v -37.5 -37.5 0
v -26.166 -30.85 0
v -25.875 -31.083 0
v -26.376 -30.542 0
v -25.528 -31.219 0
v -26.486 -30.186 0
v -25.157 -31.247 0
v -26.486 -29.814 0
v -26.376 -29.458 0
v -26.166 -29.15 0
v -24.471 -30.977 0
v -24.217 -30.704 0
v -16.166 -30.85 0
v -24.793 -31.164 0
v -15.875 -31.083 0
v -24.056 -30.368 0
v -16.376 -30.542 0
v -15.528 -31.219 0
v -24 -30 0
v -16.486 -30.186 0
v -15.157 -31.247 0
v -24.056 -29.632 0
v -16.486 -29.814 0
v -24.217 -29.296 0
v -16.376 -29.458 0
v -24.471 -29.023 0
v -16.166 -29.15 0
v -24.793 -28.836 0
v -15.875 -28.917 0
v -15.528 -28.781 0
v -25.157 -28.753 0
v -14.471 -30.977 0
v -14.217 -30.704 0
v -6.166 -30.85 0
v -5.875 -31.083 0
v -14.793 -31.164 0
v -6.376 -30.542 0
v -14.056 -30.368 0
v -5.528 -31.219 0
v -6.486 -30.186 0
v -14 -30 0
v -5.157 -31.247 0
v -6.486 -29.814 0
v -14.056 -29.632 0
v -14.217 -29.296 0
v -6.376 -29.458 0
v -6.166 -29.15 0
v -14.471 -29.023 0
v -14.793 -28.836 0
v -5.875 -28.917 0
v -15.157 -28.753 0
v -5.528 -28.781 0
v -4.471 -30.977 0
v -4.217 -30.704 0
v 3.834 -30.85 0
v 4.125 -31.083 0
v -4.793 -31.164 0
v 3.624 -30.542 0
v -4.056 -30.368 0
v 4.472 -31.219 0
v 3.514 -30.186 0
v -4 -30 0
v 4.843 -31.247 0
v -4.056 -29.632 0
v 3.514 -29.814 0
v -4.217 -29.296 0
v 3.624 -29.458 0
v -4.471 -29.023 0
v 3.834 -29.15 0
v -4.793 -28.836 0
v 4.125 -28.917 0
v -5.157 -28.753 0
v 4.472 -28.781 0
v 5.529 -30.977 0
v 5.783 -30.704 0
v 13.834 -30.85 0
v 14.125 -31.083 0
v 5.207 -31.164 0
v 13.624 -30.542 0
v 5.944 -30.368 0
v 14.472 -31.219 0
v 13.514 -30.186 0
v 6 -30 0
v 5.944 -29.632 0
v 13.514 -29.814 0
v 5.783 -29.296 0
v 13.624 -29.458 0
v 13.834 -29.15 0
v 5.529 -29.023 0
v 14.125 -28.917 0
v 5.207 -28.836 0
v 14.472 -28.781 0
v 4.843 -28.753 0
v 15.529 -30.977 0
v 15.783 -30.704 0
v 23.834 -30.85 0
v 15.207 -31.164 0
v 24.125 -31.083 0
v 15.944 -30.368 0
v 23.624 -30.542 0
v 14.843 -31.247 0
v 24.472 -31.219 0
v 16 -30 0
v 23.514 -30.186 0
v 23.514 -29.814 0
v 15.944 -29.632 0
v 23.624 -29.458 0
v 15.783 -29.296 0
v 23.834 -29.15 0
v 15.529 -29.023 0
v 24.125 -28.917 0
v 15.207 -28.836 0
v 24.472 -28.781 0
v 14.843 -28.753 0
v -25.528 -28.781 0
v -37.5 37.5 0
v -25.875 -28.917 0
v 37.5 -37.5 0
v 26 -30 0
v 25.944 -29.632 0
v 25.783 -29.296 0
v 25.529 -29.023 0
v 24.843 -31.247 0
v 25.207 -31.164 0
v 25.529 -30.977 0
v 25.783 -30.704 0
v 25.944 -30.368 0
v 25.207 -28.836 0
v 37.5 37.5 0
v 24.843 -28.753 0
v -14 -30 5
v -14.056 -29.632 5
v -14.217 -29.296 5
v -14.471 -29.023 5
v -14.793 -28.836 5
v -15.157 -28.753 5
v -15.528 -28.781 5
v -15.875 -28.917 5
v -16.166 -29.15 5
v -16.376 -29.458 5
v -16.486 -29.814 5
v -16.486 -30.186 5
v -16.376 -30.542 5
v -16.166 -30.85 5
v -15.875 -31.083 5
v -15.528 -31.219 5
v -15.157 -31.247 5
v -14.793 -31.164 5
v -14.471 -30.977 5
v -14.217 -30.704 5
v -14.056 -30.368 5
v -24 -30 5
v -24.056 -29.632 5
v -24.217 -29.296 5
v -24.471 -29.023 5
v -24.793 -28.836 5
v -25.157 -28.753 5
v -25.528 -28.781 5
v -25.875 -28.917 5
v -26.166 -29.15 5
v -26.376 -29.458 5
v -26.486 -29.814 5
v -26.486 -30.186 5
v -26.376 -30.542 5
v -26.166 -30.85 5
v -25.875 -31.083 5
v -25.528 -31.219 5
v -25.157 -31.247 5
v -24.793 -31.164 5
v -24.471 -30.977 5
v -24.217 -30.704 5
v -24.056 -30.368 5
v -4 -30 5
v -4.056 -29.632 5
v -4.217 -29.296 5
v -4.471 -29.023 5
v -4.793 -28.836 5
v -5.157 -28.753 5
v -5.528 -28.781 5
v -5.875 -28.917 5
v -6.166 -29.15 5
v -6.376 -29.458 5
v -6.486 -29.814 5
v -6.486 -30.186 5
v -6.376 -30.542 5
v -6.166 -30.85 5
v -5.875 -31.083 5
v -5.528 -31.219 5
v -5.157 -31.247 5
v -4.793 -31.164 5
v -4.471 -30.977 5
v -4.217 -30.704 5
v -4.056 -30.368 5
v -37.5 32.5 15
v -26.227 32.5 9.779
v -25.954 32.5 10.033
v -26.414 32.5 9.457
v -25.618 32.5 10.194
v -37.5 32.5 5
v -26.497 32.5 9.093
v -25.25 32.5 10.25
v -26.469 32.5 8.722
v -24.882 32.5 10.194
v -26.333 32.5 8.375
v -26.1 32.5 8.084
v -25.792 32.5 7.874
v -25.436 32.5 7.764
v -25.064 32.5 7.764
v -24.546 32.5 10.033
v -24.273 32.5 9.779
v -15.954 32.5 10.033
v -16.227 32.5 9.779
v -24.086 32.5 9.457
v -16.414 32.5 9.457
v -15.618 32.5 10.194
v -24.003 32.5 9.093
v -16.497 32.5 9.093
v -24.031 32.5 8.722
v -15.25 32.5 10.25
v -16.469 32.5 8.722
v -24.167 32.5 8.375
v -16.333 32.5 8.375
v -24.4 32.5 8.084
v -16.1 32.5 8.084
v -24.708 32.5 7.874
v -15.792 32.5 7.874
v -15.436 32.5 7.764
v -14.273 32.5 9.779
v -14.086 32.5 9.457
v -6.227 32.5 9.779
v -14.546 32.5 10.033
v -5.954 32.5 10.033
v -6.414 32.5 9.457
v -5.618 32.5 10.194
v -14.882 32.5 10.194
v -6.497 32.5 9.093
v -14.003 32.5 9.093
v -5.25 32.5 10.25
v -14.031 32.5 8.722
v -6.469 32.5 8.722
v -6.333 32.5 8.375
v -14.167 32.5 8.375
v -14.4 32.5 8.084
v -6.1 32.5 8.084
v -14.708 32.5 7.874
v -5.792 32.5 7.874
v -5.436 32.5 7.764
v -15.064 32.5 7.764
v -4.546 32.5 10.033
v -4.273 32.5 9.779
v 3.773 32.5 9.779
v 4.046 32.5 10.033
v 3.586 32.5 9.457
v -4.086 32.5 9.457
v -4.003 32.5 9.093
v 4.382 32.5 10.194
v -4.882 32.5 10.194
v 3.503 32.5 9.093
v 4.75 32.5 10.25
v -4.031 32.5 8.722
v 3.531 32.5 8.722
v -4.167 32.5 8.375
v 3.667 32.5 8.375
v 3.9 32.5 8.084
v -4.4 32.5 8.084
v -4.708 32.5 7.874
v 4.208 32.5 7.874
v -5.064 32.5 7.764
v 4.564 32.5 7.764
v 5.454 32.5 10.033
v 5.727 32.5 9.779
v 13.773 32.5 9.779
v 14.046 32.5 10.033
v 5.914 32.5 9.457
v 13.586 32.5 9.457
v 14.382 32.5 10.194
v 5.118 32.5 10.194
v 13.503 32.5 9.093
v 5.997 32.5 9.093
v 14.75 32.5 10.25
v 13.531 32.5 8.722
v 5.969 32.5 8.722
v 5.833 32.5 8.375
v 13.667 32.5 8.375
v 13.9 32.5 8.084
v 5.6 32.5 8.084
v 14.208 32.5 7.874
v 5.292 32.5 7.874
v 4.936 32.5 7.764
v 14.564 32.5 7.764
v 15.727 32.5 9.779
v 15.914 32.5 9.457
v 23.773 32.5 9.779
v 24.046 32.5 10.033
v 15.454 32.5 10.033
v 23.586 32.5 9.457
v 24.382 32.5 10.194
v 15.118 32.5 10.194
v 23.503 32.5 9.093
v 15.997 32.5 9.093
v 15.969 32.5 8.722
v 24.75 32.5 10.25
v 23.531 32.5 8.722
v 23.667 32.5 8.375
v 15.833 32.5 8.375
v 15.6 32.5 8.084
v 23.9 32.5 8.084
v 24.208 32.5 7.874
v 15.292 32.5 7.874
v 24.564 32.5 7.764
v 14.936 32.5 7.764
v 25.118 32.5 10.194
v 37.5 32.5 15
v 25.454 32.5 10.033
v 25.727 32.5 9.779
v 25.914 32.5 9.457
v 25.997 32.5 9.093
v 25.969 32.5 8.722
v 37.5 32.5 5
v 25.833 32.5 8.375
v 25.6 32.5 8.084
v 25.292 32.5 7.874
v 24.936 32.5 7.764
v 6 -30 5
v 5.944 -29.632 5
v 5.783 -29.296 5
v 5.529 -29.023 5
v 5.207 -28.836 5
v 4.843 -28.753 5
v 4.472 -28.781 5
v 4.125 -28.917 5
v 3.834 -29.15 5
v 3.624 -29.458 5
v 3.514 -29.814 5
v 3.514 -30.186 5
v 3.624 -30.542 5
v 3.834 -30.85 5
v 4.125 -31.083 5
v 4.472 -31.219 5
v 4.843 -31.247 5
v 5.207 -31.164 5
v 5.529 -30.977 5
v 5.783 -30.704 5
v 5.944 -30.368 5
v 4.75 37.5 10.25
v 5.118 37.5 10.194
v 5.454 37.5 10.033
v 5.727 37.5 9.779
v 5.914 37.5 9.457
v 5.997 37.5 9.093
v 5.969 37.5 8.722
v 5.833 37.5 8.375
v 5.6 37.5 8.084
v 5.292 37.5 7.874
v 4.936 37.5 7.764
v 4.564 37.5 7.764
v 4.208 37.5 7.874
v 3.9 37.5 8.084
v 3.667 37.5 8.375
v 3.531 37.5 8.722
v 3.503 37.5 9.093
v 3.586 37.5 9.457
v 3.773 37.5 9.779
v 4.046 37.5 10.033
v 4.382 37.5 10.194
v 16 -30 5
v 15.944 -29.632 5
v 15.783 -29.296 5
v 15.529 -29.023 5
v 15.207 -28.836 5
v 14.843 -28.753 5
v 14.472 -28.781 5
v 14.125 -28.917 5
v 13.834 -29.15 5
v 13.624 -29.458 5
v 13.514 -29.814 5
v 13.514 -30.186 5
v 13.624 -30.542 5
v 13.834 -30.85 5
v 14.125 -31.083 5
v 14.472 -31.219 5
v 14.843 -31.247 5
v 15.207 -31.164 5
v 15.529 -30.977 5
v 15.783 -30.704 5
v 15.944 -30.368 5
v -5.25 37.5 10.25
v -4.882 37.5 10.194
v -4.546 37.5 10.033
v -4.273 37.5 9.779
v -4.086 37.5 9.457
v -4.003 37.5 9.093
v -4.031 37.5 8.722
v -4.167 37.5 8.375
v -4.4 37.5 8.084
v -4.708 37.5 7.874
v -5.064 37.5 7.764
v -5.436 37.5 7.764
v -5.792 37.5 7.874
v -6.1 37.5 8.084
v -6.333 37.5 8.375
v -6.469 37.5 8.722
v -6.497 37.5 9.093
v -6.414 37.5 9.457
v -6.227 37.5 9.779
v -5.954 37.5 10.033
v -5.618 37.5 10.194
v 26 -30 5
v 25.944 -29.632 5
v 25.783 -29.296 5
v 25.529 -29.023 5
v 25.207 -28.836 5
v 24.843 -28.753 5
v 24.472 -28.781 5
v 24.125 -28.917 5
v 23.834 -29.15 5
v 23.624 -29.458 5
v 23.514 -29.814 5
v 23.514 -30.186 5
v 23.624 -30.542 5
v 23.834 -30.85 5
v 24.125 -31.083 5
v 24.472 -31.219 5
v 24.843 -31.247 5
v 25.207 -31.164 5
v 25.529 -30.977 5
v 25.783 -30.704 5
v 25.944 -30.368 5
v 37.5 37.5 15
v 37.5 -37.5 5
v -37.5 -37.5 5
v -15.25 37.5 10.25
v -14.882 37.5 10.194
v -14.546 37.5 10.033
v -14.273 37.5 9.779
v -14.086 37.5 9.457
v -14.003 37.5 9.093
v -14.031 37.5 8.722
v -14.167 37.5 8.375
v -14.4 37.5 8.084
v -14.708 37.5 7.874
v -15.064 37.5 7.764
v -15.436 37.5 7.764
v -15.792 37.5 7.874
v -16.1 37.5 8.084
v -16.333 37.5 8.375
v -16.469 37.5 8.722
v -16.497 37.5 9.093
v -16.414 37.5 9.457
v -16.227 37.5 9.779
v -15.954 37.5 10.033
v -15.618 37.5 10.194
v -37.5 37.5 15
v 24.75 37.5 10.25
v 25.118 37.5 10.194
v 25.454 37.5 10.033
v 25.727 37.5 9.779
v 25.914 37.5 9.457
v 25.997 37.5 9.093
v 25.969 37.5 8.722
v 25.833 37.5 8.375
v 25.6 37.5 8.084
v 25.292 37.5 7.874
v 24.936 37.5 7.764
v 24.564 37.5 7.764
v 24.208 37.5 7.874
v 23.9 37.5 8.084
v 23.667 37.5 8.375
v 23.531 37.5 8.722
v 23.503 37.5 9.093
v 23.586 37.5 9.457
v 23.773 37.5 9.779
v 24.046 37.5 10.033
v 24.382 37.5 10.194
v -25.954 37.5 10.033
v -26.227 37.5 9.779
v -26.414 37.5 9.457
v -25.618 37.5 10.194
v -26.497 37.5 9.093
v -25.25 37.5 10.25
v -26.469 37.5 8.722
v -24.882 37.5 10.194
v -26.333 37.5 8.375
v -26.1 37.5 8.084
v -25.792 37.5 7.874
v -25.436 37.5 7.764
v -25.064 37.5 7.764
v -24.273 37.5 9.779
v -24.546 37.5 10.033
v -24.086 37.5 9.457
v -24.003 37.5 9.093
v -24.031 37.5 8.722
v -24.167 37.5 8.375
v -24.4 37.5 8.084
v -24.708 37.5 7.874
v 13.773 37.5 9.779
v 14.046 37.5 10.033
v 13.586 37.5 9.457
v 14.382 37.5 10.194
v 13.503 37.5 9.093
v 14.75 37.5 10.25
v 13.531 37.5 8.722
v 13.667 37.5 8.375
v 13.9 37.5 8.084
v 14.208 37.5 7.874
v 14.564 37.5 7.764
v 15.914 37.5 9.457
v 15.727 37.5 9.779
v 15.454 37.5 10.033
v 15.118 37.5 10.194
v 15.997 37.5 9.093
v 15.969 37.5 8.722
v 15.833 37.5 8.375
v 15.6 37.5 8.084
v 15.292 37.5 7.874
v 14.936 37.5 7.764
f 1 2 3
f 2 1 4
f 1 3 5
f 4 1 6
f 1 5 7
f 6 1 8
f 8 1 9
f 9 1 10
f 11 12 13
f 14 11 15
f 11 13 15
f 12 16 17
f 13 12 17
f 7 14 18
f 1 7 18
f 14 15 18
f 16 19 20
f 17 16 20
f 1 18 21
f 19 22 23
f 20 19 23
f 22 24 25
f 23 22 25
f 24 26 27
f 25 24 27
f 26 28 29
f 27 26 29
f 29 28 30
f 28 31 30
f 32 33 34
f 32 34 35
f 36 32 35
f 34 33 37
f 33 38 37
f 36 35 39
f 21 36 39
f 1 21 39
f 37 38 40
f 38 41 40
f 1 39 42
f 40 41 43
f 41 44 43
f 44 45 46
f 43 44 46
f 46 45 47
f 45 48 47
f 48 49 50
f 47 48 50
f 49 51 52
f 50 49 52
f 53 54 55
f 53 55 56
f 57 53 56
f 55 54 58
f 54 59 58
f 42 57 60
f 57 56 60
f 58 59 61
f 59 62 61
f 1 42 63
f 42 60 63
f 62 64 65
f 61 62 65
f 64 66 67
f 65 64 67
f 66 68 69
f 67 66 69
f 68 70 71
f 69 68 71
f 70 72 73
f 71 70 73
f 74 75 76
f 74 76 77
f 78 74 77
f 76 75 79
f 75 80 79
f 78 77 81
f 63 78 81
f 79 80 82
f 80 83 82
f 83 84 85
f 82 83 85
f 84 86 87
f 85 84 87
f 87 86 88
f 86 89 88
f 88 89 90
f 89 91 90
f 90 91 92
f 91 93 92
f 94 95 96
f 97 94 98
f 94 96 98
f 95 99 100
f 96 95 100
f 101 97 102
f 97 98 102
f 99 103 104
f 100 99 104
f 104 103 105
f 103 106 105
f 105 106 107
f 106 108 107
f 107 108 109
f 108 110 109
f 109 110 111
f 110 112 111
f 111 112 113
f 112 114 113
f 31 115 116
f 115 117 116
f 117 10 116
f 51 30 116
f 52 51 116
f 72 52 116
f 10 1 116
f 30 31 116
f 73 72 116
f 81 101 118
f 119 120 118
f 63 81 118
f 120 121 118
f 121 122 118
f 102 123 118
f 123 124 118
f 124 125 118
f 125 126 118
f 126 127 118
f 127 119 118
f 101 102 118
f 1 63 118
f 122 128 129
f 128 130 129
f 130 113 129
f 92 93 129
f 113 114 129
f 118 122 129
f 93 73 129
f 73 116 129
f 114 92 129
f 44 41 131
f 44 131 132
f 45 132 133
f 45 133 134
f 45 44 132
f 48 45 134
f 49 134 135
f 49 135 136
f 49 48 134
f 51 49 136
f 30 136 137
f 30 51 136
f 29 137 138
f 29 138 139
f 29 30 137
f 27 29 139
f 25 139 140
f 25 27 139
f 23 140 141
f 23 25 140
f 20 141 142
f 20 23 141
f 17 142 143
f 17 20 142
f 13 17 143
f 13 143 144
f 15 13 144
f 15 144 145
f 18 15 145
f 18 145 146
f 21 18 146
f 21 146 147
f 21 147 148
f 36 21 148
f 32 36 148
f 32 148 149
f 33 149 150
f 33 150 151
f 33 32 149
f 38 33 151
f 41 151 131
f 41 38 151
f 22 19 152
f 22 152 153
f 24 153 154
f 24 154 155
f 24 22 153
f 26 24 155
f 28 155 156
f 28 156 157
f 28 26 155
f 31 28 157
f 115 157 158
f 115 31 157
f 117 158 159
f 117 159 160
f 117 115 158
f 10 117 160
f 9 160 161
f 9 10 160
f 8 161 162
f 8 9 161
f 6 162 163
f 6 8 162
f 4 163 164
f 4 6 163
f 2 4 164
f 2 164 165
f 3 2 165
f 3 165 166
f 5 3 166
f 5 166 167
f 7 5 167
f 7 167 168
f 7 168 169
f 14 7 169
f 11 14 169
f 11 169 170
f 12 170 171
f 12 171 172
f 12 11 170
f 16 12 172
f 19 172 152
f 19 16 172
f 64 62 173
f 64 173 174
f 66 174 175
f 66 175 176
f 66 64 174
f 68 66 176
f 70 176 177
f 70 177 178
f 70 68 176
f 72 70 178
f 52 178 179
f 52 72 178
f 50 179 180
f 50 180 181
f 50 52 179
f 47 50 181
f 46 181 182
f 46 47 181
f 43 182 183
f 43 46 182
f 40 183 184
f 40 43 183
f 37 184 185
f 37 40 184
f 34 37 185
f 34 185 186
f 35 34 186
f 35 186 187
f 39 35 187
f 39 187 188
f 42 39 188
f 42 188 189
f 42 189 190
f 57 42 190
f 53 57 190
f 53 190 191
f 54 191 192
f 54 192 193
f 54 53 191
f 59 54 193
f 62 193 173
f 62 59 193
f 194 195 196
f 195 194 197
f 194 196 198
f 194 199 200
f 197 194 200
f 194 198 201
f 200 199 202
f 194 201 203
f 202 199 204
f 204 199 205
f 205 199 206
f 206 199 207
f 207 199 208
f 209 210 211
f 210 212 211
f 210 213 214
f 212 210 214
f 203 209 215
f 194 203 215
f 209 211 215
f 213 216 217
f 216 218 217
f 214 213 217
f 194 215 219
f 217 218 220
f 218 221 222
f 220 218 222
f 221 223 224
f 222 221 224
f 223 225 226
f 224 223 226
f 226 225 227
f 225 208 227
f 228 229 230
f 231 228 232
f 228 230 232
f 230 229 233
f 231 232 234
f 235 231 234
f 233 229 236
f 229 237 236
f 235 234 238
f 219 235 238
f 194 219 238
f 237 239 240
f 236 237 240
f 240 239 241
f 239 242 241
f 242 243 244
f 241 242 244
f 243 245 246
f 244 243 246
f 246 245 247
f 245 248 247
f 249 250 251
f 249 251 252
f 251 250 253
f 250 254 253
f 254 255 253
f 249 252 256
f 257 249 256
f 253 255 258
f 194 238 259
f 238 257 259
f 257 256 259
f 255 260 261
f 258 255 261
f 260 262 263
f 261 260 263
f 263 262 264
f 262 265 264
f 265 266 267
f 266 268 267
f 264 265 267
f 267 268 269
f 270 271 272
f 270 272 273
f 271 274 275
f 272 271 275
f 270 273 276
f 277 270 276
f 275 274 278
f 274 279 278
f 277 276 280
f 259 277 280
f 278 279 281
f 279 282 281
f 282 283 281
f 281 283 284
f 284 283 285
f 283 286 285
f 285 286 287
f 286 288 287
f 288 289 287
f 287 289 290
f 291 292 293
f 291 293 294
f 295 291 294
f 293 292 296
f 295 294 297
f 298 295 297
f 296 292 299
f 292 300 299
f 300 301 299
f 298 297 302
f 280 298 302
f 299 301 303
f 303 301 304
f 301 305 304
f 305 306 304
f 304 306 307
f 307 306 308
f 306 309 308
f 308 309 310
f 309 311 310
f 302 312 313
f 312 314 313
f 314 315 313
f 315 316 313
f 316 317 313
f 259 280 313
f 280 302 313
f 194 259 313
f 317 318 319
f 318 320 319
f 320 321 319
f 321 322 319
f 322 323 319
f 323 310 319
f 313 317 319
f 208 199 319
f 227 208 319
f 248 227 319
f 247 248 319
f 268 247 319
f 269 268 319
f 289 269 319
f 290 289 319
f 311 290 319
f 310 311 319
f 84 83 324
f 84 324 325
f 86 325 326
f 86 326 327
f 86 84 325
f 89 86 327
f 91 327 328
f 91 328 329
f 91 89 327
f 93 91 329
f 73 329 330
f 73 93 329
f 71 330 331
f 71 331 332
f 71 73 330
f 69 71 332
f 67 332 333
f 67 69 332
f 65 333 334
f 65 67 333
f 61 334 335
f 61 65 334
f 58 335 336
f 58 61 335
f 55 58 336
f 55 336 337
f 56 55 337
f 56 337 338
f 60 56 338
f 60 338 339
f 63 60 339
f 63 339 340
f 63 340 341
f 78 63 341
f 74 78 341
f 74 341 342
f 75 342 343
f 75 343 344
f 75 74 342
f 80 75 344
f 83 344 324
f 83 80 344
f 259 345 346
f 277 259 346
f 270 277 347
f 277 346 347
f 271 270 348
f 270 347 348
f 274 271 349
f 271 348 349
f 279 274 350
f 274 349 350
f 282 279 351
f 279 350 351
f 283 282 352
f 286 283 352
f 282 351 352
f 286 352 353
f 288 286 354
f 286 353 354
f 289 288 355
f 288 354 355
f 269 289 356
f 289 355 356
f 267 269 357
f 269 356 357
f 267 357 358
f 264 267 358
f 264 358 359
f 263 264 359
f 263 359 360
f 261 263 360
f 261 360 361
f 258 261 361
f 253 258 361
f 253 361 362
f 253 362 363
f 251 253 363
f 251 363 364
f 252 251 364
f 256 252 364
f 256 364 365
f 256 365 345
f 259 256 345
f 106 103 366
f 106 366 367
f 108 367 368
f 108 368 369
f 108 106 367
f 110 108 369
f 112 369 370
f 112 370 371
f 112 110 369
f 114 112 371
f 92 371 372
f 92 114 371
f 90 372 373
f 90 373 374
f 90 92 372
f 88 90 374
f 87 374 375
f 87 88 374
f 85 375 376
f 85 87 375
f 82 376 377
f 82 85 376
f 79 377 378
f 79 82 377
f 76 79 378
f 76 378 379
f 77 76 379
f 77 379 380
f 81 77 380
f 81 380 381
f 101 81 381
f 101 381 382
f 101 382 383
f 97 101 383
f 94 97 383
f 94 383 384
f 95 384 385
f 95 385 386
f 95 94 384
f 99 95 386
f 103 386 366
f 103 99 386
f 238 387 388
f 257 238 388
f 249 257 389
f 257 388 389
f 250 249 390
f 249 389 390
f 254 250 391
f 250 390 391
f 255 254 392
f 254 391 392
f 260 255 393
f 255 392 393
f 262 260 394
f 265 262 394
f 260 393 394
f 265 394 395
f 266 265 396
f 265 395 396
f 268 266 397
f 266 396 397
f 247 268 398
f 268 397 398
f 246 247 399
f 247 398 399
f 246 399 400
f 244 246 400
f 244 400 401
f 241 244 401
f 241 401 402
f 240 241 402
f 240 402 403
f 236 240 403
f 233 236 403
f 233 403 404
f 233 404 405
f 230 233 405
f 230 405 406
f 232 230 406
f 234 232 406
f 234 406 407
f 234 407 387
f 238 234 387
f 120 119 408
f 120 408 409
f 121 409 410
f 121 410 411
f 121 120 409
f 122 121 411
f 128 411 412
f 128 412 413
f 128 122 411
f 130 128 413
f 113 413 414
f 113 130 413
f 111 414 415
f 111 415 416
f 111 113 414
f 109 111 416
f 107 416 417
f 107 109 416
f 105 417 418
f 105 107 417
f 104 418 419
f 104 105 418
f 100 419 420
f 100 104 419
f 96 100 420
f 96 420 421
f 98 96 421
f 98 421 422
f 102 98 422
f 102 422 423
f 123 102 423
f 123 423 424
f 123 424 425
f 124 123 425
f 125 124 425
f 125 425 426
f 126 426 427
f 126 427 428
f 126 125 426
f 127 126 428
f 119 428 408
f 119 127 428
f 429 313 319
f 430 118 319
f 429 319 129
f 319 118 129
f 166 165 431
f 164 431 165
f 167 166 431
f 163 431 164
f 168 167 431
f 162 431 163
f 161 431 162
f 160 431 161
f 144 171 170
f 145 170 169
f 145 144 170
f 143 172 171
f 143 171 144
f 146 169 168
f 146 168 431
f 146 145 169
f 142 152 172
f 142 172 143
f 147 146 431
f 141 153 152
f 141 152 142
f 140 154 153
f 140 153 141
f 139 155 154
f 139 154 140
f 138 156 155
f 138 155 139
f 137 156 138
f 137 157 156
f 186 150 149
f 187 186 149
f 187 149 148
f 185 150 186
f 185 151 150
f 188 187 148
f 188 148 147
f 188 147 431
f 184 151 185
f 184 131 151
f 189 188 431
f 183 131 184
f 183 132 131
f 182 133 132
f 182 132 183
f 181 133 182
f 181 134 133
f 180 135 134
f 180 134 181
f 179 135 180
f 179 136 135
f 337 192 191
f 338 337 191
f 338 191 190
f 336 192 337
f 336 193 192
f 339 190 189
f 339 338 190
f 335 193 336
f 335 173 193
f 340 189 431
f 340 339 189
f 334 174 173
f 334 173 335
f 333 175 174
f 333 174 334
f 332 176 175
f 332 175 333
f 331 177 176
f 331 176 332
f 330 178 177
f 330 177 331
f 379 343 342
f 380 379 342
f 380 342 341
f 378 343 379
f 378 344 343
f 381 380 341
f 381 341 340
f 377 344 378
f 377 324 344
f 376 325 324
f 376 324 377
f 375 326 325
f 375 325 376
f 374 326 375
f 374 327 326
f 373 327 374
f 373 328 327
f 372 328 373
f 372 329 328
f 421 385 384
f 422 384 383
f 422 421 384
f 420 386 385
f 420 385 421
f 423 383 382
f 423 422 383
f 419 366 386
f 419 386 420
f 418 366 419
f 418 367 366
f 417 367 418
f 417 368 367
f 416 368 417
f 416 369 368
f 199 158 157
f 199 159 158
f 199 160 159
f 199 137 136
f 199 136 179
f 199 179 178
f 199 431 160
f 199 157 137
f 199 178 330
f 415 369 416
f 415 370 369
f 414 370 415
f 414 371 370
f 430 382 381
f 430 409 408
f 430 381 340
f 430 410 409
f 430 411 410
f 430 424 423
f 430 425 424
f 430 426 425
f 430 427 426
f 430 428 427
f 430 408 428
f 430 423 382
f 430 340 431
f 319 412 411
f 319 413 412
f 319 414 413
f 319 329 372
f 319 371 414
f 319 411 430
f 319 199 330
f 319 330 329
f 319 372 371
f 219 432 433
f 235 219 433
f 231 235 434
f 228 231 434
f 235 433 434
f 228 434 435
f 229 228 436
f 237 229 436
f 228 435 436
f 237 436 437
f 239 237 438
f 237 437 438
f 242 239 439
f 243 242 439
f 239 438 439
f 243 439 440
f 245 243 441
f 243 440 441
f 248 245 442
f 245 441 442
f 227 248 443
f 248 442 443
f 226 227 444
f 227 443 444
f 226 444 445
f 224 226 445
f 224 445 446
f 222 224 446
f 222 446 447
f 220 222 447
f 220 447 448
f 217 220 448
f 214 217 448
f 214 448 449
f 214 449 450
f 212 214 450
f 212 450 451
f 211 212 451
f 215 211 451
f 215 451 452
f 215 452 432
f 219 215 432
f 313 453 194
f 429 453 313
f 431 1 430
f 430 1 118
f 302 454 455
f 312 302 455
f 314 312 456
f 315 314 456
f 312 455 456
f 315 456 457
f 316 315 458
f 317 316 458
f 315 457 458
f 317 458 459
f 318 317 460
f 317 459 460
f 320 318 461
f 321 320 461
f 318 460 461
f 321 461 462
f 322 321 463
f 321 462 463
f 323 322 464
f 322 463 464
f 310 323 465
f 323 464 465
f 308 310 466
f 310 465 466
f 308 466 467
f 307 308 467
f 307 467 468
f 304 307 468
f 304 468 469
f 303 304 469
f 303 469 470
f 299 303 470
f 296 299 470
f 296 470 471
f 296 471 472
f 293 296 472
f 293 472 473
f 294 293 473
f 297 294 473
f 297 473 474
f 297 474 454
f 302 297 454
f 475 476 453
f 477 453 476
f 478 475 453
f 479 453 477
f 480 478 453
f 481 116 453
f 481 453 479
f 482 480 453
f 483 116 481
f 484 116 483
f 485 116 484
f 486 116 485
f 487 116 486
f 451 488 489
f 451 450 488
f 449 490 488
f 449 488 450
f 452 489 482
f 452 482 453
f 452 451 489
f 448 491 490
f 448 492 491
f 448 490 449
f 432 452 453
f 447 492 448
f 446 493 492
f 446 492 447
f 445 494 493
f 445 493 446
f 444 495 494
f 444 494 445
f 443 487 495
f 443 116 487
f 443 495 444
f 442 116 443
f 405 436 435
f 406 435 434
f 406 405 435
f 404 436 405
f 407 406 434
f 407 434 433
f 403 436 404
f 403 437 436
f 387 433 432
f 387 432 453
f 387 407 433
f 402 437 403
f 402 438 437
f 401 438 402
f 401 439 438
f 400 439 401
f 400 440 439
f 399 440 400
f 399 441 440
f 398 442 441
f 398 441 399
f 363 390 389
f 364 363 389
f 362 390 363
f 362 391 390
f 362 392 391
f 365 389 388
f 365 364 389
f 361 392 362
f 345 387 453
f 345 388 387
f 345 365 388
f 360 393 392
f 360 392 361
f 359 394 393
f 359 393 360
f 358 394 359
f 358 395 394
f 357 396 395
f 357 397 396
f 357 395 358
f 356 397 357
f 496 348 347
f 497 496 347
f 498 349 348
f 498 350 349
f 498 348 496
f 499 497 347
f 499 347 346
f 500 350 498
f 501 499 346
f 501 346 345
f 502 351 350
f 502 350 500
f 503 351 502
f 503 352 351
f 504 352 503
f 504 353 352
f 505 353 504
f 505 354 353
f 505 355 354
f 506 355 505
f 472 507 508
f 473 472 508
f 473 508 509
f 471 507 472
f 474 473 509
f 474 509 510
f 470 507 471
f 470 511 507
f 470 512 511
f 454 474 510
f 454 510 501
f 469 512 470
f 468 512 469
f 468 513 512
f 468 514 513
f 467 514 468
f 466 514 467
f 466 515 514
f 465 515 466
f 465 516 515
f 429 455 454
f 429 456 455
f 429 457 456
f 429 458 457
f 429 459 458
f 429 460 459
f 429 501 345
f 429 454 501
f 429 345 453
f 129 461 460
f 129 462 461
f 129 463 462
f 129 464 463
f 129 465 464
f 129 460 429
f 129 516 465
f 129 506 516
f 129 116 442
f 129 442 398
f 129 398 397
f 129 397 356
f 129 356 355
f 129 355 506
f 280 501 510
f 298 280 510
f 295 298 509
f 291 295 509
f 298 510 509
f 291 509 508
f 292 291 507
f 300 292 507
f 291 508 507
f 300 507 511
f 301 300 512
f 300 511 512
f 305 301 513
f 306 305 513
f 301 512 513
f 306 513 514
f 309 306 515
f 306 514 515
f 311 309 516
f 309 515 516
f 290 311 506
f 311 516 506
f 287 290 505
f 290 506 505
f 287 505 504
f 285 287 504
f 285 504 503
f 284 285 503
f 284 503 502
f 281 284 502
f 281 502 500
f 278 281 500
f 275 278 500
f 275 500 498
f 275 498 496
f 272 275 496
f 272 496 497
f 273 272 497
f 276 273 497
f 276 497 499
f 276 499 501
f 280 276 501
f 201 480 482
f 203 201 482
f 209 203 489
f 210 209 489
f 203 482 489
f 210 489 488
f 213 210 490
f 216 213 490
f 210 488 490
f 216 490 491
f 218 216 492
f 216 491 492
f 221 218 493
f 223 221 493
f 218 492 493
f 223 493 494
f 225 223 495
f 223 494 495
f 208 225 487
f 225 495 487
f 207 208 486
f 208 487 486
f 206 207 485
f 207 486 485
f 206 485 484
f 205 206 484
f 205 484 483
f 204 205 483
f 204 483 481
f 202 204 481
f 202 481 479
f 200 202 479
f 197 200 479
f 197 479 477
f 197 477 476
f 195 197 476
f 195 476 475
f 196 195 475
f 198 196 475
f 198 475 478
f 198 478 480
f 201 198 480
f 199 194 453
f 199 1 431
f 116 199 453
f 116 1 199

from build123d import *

# Parameters (mm, degrees)
SKETCH1_W           = 75
SKETCH1_H           = 75
SKETCH1_R           = 1.25
BOSS_EXTRUDE1_DEPTH = 5
SKETCH2_W           = 75
SKETCH2_H           = 5
BOSS_EXTRUDE2_DEPTH = 10
CUT_EXTRUDE1_REACH  = 87.184
SKETCH3_R           = 1.25


with BuildPart() as part:
    # Sketch1 → Boss-Extrude1 (new body)
    with BuildSketch(Plane.XY):
        Rectangle(SKETCH1_W, SKETCH1_H)
        with Locations((-25.25, -30)):
            Circle(SKETCH1_R, mode=Mode.SUBTRACT)
        with Locations((-15.25, -30)):
            Circle(SKETCH1_R, mode=Mode.SUBTRACT)
        with Locations((-5.25, -30)):
            Circle(SKETCH1_R, mode=Mode.SUBTRACT)
        with Locations((4.75, -30)):
            Circle(SKETCH1_R, mode=Mode.SUBTRACT)
        with Locations((14.75, -30)):
            Circle(SKETCH1_R, mode=Mode.SUBTRACT)
        with Locations((24.75, -30)):
            Circle(SKETCH1_R, mode=Mode.SUBTRACT)
    extrude(amount=BOSS_EXTRUDE1_DEPTH)

    # Sketch2 → Boss-Extrude2 (add)
    with BuildSketch(Plane.XY.offset(5)):
        with Locations((0, 35)):
            Rectangle(SKETCH2_W, SKETCH2_H)
    extrude(amount=BOSS_EXTRUDE2_DEPTH)

    # Sketch3 → Cut-Extrude1 (cut, up to next)
    with BuildSketch(Plane(origin=(0, 37.5, 0), x_dir=(1, 0, 0), z_dir=(0, 1, 0)), mode=Mode.PRIVATE) as cut_extrude1_sk1:
        with Locations(Location((-25.25, -9, 0), (0, 0, 270))):
            Circle(SKETCH3_R)
    cut_extrude1_tool1 = extrude(cut_extrude1_sk1.sketch, amount=-CUT_EXTRUDE1_REACH, mode=Mode.PRIVATE) & part.part
    # Sketch3 → Cut-Extrude1 (cut, up to next)
    with BuildSketch(Plane(origin=(0, 37.5, 0), x_dir=(1, 0, 0), z_dir=(0, 1, 0)), mode=Mode.PRIVATE) as cut_extrude1_sk2:
        with Locations(Location((-15.25, -9, 0), (0, 0, 270))):
            Circle(SKETCH3_R)
    cut_extrude1_tool2 = extrude(cut_extrude1_sk2.sketch, amount=-CUT_EXTRUDE1_REACH, mode=Mode.PRIVATE) & part.part
    # Sketch3 → Cut-Extrude1 (cut, up to next)
    with BuildSketch(Plane(origin=(0, 37.5, 0), x_dir=(1, 0, 0), z_dir=(0, 1, 0)), mode=Mode.PRIVATE) as cut_extrude1_sk3:
        with Locations(Location((-5.25, -9, 0), (0, 0, 270))):
            Circle(SKETCH3_R)
    cut_extrude1_tool3 = extrude(cut_extrude1_sk3.sketch, amount=-CUT_EXTRUDE1_REACH, mode=Mode.PRIVATE) & part.part
    # Sketch3 → Cut-Extrude1 (cut, up to next)
    with BuildSketch(Plane(origin=(0, 37.5, 0), x_dir=(1, 0, 0), z_dir=(0, 1, 0)), mode=Mode.PRIVATE) as cut_extrude1_sk4:
        with Locations(Location((4.75, -9, 0), (0, 0, 270))):
            Circle(SKETCH3_R)
    cut_extrude1_tool4 = extrude(cut_extrude1_sk4.sketch, amount=-CUT_EXTRUDE1_REACH, mode=Mode.PRIVATE) & part.part
    # Sketch3 → Cut-Extrude1 (cut, up to next)
    with BuildSketch(Plane(origin=(0, 37.5, 0), x_dir=(1, 0, 0), z_dir=(0, 1, 0)), mode=Mode.PRIVATE) as cut_extrude1_sk5:
        with Locations(Location((14.75, -9, 0), (0, 0, 270))):
            Circle(SKETCH3_R)
    cut_extrude1_tool5 = extrude(cut_extrude1_sk5.sketch, amount=-CUT_EXTRUDE1_REACH, mode=Mode.PRIVATE) & part.part
    # Sketch3 → Cut-Extrude1 (cut, up to next)
    with BuildSketch(Plane(origin=(0, 37.5, 0), x_dir=(1, 0, 0), z_dir=(0, 1, 0)), mode=Mode.PRIVATE) as cut_extrude1_sk6:
        with Locations(Location((24.75, -9, 0), (0, 0, 270))):
            Circle(SKETCH3_R)
    cut_extrude1_tool6 = extrude(cut_extrude1_sk6.sketch, amount=-CUT_EXTRUDE1_REACH, mode=Mode.PRIVATE) & part.part
    add(cut_extrude1_tool1.solids().sort_by_distance((-25.25, 37.5, 9))[0], mode=Mode.SUBTRACT)
    add(cut_extrude1_tool2.solids().sort_by_distance((-15.25, 37.5, 9))[0], mode=Mode.SUBTRACT)
    add(cut_extrude1_tool3.solids().sort_by_distance((-5.25, 37.5, 9))[0], mode=Mode.SUBTRACT)
    add(cut_extrude1_tool4.solids().sort_by_distance((4.75, 37.5, 9))[0], mode=Mode.SUBTRACT)
    add(cut_extrude1_tool5.solids().sort_by_distance((14.75, 37.5, 9))[0], mode=Mode.SUBTRACT)
    add(cut_extrude1_tool6.solids().sort_by_distance((24.75, 37.5, 9))[0], mode=Mode.SUBTRACT)


solid = part.part
